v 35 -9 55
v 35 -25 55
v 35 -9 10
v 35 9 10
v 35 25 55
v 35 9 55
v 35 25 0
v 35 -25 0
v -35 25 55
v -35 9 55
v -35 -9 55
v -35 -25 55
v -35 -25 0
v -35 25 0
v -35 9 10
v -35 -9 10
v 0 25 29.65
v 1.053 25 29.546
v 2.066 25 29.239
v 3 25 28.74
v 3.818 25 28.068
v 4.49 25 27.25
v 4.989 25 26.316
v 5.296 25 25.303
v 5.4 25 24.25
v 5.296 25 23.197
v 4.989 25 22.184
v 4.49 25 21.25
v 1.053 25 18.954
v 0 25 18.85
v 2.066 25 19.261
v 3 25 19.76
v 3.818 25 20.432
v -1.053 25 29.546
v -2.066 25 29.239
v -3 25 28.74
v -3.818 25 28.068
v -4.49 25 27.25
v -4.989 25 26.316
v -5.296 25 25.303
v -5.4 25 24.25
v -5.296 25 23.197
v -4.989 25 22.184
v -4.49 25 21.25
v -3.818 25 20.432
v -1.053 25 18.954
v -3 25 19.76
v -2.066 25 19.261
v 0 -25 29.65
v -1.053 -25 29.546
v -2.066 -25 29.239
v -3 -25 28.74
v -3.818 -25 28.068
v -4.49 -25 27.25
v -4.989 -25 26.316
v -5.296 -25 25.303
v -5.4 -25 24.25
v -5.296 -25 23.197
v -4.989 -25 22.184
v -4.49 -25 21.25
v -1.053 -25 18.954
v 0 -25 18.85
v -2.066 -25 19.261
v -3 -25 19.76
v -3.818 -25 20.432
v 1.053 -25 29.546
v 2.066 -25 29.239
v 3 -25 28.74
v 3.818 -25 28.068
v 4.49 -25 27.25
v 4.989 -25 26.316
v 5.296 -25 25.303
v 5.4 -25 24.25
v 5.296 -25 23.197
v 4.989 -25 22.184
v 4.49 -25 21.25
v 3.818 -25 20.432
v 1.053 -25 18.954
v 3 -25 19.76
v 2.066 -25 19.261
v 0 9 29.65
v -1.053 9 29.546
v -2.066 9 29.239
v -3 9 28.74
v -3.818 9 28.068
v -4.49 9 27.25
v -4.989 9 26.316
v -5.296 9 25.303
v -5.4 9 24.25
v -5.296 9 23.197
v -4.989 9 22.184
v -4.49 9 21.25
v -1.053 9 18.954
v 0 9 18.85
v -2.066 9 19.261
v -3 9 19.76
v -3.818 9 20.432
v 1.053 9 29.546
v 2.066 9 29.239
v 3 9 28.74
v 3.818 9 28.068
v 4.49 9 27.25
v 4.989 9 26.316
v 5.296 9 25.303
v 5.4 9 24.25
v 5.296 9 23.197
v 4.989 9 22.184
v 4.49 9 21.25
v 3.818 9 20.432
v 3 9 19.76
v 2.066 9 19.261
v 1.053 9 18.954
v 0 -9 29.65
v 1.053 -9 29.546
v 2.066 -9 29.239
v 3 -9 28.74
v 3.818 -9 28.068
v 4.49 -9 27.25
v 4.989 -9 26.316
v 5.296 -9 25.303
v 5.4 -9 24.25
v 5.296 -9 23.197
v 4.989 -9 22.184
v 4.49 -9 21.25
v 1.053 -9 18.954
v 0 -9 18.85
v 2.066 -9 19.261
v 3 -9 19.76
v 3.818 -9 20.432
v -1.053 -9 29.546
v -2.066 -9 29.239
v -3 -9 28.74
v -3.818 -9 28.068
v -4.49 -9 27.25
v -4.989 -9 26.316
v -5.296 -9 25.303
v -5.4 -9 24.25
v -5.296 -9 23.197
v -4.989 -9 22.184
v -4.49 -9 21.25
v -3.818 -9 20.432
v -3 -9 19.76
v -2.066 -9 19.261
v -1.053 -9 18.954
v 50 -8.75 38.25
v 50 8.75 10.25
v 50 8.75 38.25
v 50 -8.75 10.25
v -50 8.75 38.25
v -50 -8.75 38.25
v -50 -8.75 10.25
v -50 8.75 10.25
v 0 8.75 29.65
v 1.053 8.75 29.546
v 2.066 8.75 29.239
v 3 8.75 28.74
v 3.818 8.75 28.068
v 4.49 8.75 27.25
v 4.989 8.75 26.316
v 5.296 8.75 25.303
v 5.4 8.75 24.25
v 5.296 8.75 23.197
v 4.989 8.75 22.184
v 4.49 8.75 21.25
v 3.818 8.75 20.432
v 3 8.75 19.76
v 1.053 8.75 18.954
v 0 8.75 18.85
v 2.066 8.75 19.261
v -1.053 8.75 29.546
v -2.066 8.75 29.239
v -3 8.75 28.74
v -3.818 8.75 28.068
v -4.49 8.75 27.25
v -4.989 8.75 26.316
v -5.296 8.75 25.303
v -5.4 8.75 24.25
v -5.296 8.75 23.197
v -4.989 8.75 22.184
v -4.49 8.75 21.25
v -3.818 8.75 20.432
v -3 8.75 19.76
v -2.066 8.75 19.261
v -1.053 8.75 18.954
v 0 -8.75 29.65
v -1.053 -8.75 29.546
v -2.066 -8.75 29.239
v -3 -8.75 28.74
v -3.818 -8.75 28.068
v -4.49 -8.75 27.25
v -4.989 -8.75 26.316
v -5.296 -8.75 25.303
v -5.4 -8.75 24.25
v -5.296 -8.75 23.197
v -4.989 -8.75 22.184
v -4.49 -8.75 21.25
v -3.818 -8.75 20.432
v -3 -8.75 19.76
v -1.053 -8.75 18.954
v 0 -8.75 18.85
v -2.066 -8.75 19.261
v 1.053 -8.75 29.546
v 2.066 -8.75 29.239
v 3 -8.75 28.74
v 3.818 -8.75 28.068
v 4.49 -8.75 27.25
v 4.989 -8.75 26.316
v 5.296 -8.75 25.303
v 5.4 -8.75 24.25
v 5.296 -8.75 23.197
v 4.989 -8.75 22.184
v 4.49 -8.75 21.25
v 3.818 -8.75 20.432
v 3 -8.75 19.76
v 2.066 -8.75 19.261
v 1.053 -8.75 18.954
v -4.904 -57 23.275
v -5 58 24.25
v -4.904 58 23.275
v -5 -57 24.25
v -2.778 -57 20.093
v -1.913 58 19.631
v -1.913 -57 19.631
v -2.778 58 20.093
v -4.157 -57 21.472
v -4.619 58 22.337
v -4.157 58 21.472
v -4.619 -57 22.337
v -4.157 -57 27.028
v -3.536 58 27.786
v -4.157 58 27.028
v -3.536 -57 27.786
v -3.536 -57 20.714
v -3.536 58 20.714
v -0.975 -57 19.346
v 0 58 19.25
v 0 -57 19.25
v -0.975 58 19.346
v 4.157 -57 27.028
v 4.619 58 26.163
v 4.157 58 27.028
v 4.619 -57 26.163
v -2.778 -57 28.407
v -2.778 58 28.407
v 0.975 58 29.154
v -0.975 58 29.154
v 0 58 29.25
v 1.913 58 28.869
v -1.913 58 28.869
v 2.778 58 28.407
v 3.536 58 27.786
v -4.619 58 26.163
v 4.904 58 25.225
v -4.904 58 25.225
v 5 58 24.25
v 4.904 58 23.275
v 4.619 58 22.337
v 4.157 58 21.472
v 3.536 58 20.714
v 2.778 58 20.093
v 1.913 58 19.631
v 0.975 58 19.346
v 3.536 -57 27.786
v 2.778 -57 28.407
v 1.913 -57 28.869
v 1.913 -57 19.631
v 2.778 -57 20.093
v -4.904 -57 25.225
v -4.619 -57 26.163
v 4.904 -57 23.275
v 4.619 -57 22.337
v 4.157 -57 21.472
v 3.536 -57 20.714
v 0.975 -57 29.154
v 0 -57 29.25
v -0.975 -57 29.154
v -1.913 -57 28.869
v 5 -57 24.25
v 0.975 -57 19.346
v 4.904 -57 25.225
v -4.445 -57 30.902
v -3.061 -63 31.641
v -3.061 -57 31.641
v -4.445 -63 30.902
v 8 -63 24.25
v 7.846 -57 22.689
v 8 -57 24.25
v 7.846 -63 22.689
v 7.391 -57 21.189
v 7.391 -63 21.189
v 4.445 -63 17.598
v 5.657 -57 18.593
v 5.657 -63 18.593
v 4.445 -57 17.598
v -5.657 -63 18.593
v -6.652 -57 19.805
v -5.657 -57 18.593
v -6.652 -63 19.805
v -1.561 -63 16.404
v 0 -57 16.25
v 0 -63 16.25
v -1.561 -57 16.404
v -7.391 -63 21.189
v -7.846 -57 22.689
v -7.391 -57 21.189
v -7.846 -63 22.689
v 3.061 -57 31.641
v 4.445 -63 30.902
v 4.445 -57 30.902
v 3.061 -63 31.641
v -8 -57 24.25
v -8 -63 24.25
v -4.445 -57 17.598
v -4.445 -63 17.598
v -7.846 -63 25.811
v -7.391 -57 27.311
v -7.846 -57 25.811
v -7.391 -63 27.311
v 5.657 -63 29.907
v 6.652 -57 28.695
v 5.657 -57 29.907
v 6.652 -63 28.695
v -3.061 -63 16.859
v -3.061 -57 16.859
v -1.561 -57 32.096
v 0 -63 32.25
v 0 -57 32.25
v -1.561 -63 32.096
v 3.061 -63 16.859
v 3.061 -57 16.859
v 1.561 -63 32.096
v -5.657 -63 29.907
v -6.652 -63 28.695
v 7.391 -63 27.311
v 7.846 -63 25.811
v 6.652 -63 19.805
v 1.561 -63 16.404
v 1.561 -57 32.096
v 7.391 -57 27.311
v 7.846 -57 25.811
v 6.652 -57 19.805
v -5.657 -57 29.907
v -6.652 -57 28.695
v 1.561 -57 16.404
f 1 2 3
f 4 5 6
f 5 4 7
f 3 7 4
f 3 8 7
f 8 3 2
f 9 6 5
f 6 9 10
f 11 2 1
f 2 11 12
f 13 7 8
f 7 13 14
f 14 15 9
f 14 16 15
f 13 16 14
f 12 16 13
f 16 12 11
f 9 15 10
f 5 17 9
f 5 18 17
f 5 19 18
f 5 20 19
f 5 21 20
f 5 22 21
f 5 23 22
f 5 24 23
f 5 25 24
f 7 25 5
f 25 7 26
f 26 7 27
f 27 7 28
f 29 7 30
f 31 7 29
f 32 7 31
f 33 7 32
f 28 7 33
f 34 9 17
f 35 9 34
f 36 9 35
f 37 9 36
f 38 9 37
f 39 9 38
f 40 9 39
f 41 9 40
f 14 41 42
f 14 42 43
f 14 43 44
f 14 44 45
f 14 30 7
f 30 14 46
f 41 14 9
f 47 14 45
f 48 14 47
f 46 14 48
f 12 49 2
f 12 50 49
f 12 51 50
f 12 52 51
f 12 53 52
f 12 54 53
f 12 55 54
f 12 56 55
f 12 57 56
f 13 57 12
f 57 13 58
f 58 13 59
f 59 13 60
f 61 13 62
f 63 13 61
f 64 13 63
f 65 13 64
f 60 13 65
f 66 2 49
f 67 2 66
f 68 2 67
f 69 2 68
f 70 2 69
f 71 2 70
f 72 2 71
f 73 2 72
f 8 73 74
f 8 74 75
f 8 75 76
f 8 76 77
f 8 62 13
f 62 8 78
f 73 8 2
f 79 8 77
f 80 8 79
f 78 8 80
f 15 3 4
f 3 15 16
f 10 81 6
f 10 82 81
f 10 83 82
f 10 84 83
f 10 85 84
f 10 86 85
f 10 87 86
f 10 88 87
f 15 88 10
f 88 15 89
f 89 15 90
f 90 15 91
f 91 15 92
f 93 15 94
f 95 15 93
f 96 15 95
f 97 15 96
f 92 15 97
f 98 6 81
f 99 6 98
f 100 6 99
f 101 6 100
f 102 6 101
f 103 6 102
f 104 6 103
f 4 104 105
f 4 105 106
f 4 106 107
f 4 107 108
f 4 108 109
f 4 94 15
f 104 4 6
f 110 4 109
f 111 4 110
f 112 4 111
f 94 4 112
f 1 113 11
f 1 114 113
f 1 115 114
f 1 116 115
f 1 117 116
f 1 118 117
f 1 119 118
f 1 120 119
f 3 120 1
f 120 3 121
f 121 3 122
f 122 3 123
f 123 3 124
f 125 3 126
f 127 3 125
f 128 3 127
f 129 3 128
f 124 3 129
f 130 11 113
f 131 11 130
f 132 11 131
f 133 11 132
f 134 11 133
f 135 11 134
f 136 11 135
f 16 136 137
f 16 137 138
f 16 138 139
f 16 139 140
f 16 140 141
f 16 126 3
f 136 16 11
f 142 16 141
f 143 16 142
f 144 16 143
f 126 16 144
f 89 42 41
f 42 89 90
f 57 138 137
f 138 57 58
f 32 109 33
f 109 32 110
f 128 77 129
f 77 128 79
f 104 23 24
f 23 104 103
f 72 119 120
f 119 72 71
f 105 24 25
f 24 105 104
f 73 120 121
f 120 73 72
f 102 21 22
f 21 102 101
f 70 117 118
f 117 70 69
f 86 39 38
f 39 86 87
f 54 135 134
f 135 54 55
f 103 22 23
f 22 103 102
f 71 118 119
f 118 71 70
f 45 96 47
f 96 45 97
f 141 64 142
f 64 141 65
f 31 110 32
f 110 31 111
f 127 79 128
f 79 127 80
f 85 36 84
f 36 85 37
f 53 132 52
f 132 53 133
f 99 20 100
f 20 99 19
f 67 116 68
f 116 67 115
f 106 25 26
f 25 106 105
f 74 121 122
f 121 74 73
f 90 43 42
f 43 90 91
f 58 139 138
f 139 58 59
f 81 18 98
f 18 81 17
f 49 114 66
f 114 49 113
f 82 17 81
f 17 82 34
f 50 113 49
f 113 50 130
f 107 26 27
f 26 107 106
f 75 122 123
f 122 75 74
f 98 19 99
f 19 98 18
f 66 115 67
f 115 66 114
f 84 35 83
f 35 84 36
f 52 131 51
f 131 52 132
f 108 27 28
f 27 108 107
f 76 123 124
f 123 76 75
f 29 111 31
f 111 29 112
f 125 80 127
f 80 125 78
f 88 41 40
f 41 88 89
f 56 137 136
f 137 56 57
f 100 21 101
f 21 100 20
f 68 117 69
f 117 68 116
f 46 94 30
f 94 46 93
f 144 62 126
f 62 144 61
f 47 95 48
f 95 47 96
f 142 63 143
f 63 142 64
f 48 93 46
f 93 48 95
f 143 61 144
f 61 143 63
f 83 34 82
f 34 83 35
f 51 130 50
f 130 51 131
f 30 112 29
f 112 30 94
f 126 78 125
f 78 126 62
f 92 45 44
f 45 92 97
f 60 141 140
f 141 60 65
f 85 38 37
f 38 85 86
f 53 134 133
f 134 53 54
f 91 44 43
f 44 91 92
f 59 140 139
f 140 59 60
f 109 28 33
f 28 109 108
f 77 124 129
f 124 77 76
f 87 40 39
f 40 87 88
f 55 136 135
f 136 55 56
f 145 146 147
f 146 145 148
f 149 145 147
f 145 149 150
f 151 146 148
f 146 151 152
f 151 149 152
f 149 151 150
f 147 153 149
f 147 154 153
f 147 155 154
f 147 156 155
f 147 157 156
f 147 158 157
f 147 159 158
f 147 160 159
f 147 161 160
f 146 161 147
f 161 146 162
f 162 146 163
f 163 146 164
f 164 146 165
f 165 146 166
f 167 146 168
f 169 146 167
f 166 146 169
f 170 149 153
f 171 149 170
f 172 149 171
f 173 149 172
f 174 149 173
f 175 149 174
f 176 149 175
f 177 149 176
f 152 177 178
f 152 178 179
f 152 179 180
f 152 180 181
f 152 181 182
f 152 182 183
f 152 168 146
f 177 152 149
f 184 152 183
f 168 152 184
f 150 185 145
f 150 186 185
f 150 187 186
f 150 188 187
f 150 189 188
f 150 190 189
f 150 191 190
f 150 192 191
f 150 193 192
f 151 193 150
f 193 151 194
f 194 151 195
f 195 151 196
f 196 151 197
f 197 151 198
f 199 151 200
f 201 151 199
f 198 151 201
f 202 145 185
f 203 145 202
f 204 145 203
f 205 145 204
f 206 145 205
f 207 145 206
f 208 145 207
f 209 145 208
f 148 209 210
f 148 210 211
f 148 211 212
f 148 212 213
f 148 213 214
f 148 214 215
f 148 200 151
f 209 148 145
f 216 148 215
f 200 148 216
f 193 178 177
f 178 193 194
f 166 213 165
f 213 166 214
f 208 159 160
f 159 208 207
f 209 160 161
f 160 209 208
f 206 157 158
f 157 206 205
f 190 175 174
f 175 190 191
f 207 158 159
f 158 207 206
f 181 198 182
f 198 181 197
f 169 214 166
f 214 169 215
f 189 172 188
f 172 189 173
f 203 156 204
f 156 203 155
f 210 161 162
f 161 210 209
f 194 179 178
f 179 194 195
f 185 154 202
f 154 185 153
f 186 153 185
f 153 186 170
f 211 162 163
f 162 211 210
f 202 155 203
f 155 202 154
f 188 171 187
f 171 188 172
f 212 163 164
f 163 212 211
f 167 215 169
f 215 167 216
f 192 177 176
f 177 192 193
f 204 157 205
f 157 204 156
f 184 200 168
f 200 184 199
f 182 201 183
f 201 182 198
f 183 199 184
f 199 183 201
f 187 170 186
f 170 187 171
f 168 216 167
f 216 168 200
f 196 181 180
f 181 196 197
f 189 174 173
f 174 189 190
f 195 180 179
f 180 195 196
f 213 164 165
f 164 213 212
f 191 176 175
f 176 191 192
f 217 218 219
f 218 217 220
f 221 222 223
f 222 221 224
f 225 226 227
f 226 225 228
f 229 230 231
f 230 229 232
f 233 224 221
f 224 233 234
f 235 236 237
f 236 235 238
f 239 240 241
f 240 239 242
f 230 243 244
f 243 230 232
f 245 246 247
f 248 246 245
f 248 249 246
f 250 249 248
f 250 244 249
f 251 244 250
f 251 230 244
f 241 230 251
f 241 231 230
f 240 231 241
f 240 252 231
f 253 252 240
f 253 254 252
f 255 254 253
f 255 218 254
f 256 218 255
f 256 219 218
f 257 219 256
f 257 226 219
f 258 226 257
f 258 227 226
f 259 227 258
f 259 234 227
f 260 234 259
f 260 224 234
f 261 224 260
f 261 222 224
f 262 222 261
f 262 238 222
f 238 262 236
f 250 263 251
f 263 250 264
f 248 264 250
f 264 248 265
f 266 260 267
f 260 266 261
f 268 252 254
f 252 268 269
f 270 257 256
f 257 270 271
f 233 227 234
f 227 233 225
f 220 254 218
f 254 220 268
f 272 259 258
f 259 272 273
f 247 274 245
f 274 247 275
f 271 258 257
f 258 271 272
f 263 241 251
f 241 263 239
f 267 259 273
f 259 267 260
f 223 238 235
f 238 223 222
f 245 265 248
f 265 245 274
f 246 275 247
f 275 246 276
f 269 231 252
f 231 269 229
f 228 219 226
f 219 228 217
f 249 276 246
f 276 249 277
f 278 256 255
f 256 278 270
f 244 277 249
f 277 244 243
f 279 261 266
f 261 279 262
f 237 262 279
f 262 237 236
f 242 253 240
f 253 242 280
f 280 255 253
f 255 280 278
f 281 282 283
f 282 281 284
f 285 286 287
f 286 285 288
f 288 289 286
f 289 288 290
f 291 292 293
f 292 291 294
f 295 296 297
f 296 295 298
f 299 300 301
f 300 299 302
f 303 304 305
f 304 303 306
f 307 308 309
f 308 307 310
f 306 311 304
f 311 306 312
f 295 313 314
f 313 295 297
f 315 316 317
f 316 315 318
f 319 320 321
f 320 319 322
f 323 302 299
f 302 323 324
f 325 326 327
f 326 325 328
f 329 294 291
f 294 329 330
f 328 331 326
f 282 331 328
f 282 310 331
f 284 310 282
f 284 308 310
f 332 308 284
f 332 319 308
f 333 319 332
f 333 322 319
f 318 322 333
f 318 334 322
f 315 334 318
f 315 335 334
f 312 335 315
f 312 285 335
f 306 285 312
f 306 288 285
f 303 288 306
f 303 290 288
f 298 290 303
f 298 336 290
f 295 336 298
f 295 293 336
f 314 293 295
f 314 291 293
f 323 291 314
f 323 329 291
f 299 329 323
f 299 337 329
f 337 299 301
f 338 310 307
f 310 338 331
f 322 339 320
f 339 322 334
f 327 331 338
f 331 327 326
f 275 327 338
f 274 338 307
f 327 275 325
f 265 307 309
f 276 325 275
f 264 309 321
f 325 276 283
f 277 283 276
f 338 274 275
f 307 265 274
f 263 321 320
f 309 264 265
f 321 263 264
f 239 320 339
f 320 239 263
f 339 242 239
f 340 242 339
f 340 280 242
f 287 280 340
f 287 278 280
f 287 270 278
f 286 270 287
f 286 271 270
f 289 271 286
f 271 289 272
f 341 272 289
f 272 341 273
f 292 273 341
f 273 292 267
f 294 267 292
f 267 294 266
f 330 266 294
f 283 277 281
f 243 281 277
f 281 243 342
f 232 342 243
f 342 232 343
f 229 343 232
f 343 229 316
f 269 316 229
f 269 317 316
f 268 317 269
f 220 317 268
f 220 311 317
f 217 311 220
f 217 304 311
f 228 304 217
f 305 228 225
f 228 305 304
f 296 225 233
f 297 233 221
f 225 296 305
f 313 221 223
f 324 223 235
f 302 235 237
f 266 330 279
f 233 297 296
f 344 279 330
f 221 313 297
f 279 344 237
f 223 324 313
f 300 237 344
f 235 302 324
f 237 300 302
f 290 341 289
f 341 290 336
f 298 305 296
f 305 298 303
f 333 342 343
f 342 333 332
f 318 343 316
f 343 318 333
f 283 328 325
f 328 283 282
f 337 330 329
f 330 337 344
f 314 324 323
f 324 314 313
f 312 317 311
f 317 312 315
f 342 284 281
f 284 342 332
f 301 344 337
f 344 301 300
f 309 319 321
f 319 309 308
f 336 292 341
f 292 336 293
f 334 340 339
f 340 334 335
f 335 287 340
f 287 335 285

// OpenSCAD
$fn = 32;

// ------------------------------------------------------------------------
// Clevis joint: 70 mm clevis, pin d10
// Every part is its own module, assembly() places them once.
// ------------------------------------------------------------------------

// --- part 1 ---
module clevis() {
  difference() {
    translate([-35, -25, 0]) cube([70, 50, 55]);
    translate([-36, -9, 10]) cube([72, 18, 46]);
    translate([0, 0, 24.25]) rotate([90, 0, 0]) cylinder(h = 52, d = 10.8, center = true);
  }
}

// --- part 2 ---
module eye() {
  difference() {
    translate([-50, -8.75, 0]) cube([100, 17.5, 28]);
    translate([0, 0, 14]) rotate([90, 0, 0]) cylinder(h = 19.5, d = 10.8, center = true);
  }
}

// --- part 3 ---
module pin() {
  rotate([0, 90, 0]) cylinder(h = 116, d = 10, center = true);
  translate([-63, 0, 0]) rotate([0, 90, 0]) cylinder(h = 6, d = 16);
}

// --- assembly ---
module assembly() {
  translate([0, 0, 0]) rotate([0, 0, 0]) clevis();
  translate([0, 0, 10.25]) rotate([0, 0, 0]) eye();
  translate([0, 0, 24.25]) rotate([0, 0, 90]) pin();
}

assembly();
